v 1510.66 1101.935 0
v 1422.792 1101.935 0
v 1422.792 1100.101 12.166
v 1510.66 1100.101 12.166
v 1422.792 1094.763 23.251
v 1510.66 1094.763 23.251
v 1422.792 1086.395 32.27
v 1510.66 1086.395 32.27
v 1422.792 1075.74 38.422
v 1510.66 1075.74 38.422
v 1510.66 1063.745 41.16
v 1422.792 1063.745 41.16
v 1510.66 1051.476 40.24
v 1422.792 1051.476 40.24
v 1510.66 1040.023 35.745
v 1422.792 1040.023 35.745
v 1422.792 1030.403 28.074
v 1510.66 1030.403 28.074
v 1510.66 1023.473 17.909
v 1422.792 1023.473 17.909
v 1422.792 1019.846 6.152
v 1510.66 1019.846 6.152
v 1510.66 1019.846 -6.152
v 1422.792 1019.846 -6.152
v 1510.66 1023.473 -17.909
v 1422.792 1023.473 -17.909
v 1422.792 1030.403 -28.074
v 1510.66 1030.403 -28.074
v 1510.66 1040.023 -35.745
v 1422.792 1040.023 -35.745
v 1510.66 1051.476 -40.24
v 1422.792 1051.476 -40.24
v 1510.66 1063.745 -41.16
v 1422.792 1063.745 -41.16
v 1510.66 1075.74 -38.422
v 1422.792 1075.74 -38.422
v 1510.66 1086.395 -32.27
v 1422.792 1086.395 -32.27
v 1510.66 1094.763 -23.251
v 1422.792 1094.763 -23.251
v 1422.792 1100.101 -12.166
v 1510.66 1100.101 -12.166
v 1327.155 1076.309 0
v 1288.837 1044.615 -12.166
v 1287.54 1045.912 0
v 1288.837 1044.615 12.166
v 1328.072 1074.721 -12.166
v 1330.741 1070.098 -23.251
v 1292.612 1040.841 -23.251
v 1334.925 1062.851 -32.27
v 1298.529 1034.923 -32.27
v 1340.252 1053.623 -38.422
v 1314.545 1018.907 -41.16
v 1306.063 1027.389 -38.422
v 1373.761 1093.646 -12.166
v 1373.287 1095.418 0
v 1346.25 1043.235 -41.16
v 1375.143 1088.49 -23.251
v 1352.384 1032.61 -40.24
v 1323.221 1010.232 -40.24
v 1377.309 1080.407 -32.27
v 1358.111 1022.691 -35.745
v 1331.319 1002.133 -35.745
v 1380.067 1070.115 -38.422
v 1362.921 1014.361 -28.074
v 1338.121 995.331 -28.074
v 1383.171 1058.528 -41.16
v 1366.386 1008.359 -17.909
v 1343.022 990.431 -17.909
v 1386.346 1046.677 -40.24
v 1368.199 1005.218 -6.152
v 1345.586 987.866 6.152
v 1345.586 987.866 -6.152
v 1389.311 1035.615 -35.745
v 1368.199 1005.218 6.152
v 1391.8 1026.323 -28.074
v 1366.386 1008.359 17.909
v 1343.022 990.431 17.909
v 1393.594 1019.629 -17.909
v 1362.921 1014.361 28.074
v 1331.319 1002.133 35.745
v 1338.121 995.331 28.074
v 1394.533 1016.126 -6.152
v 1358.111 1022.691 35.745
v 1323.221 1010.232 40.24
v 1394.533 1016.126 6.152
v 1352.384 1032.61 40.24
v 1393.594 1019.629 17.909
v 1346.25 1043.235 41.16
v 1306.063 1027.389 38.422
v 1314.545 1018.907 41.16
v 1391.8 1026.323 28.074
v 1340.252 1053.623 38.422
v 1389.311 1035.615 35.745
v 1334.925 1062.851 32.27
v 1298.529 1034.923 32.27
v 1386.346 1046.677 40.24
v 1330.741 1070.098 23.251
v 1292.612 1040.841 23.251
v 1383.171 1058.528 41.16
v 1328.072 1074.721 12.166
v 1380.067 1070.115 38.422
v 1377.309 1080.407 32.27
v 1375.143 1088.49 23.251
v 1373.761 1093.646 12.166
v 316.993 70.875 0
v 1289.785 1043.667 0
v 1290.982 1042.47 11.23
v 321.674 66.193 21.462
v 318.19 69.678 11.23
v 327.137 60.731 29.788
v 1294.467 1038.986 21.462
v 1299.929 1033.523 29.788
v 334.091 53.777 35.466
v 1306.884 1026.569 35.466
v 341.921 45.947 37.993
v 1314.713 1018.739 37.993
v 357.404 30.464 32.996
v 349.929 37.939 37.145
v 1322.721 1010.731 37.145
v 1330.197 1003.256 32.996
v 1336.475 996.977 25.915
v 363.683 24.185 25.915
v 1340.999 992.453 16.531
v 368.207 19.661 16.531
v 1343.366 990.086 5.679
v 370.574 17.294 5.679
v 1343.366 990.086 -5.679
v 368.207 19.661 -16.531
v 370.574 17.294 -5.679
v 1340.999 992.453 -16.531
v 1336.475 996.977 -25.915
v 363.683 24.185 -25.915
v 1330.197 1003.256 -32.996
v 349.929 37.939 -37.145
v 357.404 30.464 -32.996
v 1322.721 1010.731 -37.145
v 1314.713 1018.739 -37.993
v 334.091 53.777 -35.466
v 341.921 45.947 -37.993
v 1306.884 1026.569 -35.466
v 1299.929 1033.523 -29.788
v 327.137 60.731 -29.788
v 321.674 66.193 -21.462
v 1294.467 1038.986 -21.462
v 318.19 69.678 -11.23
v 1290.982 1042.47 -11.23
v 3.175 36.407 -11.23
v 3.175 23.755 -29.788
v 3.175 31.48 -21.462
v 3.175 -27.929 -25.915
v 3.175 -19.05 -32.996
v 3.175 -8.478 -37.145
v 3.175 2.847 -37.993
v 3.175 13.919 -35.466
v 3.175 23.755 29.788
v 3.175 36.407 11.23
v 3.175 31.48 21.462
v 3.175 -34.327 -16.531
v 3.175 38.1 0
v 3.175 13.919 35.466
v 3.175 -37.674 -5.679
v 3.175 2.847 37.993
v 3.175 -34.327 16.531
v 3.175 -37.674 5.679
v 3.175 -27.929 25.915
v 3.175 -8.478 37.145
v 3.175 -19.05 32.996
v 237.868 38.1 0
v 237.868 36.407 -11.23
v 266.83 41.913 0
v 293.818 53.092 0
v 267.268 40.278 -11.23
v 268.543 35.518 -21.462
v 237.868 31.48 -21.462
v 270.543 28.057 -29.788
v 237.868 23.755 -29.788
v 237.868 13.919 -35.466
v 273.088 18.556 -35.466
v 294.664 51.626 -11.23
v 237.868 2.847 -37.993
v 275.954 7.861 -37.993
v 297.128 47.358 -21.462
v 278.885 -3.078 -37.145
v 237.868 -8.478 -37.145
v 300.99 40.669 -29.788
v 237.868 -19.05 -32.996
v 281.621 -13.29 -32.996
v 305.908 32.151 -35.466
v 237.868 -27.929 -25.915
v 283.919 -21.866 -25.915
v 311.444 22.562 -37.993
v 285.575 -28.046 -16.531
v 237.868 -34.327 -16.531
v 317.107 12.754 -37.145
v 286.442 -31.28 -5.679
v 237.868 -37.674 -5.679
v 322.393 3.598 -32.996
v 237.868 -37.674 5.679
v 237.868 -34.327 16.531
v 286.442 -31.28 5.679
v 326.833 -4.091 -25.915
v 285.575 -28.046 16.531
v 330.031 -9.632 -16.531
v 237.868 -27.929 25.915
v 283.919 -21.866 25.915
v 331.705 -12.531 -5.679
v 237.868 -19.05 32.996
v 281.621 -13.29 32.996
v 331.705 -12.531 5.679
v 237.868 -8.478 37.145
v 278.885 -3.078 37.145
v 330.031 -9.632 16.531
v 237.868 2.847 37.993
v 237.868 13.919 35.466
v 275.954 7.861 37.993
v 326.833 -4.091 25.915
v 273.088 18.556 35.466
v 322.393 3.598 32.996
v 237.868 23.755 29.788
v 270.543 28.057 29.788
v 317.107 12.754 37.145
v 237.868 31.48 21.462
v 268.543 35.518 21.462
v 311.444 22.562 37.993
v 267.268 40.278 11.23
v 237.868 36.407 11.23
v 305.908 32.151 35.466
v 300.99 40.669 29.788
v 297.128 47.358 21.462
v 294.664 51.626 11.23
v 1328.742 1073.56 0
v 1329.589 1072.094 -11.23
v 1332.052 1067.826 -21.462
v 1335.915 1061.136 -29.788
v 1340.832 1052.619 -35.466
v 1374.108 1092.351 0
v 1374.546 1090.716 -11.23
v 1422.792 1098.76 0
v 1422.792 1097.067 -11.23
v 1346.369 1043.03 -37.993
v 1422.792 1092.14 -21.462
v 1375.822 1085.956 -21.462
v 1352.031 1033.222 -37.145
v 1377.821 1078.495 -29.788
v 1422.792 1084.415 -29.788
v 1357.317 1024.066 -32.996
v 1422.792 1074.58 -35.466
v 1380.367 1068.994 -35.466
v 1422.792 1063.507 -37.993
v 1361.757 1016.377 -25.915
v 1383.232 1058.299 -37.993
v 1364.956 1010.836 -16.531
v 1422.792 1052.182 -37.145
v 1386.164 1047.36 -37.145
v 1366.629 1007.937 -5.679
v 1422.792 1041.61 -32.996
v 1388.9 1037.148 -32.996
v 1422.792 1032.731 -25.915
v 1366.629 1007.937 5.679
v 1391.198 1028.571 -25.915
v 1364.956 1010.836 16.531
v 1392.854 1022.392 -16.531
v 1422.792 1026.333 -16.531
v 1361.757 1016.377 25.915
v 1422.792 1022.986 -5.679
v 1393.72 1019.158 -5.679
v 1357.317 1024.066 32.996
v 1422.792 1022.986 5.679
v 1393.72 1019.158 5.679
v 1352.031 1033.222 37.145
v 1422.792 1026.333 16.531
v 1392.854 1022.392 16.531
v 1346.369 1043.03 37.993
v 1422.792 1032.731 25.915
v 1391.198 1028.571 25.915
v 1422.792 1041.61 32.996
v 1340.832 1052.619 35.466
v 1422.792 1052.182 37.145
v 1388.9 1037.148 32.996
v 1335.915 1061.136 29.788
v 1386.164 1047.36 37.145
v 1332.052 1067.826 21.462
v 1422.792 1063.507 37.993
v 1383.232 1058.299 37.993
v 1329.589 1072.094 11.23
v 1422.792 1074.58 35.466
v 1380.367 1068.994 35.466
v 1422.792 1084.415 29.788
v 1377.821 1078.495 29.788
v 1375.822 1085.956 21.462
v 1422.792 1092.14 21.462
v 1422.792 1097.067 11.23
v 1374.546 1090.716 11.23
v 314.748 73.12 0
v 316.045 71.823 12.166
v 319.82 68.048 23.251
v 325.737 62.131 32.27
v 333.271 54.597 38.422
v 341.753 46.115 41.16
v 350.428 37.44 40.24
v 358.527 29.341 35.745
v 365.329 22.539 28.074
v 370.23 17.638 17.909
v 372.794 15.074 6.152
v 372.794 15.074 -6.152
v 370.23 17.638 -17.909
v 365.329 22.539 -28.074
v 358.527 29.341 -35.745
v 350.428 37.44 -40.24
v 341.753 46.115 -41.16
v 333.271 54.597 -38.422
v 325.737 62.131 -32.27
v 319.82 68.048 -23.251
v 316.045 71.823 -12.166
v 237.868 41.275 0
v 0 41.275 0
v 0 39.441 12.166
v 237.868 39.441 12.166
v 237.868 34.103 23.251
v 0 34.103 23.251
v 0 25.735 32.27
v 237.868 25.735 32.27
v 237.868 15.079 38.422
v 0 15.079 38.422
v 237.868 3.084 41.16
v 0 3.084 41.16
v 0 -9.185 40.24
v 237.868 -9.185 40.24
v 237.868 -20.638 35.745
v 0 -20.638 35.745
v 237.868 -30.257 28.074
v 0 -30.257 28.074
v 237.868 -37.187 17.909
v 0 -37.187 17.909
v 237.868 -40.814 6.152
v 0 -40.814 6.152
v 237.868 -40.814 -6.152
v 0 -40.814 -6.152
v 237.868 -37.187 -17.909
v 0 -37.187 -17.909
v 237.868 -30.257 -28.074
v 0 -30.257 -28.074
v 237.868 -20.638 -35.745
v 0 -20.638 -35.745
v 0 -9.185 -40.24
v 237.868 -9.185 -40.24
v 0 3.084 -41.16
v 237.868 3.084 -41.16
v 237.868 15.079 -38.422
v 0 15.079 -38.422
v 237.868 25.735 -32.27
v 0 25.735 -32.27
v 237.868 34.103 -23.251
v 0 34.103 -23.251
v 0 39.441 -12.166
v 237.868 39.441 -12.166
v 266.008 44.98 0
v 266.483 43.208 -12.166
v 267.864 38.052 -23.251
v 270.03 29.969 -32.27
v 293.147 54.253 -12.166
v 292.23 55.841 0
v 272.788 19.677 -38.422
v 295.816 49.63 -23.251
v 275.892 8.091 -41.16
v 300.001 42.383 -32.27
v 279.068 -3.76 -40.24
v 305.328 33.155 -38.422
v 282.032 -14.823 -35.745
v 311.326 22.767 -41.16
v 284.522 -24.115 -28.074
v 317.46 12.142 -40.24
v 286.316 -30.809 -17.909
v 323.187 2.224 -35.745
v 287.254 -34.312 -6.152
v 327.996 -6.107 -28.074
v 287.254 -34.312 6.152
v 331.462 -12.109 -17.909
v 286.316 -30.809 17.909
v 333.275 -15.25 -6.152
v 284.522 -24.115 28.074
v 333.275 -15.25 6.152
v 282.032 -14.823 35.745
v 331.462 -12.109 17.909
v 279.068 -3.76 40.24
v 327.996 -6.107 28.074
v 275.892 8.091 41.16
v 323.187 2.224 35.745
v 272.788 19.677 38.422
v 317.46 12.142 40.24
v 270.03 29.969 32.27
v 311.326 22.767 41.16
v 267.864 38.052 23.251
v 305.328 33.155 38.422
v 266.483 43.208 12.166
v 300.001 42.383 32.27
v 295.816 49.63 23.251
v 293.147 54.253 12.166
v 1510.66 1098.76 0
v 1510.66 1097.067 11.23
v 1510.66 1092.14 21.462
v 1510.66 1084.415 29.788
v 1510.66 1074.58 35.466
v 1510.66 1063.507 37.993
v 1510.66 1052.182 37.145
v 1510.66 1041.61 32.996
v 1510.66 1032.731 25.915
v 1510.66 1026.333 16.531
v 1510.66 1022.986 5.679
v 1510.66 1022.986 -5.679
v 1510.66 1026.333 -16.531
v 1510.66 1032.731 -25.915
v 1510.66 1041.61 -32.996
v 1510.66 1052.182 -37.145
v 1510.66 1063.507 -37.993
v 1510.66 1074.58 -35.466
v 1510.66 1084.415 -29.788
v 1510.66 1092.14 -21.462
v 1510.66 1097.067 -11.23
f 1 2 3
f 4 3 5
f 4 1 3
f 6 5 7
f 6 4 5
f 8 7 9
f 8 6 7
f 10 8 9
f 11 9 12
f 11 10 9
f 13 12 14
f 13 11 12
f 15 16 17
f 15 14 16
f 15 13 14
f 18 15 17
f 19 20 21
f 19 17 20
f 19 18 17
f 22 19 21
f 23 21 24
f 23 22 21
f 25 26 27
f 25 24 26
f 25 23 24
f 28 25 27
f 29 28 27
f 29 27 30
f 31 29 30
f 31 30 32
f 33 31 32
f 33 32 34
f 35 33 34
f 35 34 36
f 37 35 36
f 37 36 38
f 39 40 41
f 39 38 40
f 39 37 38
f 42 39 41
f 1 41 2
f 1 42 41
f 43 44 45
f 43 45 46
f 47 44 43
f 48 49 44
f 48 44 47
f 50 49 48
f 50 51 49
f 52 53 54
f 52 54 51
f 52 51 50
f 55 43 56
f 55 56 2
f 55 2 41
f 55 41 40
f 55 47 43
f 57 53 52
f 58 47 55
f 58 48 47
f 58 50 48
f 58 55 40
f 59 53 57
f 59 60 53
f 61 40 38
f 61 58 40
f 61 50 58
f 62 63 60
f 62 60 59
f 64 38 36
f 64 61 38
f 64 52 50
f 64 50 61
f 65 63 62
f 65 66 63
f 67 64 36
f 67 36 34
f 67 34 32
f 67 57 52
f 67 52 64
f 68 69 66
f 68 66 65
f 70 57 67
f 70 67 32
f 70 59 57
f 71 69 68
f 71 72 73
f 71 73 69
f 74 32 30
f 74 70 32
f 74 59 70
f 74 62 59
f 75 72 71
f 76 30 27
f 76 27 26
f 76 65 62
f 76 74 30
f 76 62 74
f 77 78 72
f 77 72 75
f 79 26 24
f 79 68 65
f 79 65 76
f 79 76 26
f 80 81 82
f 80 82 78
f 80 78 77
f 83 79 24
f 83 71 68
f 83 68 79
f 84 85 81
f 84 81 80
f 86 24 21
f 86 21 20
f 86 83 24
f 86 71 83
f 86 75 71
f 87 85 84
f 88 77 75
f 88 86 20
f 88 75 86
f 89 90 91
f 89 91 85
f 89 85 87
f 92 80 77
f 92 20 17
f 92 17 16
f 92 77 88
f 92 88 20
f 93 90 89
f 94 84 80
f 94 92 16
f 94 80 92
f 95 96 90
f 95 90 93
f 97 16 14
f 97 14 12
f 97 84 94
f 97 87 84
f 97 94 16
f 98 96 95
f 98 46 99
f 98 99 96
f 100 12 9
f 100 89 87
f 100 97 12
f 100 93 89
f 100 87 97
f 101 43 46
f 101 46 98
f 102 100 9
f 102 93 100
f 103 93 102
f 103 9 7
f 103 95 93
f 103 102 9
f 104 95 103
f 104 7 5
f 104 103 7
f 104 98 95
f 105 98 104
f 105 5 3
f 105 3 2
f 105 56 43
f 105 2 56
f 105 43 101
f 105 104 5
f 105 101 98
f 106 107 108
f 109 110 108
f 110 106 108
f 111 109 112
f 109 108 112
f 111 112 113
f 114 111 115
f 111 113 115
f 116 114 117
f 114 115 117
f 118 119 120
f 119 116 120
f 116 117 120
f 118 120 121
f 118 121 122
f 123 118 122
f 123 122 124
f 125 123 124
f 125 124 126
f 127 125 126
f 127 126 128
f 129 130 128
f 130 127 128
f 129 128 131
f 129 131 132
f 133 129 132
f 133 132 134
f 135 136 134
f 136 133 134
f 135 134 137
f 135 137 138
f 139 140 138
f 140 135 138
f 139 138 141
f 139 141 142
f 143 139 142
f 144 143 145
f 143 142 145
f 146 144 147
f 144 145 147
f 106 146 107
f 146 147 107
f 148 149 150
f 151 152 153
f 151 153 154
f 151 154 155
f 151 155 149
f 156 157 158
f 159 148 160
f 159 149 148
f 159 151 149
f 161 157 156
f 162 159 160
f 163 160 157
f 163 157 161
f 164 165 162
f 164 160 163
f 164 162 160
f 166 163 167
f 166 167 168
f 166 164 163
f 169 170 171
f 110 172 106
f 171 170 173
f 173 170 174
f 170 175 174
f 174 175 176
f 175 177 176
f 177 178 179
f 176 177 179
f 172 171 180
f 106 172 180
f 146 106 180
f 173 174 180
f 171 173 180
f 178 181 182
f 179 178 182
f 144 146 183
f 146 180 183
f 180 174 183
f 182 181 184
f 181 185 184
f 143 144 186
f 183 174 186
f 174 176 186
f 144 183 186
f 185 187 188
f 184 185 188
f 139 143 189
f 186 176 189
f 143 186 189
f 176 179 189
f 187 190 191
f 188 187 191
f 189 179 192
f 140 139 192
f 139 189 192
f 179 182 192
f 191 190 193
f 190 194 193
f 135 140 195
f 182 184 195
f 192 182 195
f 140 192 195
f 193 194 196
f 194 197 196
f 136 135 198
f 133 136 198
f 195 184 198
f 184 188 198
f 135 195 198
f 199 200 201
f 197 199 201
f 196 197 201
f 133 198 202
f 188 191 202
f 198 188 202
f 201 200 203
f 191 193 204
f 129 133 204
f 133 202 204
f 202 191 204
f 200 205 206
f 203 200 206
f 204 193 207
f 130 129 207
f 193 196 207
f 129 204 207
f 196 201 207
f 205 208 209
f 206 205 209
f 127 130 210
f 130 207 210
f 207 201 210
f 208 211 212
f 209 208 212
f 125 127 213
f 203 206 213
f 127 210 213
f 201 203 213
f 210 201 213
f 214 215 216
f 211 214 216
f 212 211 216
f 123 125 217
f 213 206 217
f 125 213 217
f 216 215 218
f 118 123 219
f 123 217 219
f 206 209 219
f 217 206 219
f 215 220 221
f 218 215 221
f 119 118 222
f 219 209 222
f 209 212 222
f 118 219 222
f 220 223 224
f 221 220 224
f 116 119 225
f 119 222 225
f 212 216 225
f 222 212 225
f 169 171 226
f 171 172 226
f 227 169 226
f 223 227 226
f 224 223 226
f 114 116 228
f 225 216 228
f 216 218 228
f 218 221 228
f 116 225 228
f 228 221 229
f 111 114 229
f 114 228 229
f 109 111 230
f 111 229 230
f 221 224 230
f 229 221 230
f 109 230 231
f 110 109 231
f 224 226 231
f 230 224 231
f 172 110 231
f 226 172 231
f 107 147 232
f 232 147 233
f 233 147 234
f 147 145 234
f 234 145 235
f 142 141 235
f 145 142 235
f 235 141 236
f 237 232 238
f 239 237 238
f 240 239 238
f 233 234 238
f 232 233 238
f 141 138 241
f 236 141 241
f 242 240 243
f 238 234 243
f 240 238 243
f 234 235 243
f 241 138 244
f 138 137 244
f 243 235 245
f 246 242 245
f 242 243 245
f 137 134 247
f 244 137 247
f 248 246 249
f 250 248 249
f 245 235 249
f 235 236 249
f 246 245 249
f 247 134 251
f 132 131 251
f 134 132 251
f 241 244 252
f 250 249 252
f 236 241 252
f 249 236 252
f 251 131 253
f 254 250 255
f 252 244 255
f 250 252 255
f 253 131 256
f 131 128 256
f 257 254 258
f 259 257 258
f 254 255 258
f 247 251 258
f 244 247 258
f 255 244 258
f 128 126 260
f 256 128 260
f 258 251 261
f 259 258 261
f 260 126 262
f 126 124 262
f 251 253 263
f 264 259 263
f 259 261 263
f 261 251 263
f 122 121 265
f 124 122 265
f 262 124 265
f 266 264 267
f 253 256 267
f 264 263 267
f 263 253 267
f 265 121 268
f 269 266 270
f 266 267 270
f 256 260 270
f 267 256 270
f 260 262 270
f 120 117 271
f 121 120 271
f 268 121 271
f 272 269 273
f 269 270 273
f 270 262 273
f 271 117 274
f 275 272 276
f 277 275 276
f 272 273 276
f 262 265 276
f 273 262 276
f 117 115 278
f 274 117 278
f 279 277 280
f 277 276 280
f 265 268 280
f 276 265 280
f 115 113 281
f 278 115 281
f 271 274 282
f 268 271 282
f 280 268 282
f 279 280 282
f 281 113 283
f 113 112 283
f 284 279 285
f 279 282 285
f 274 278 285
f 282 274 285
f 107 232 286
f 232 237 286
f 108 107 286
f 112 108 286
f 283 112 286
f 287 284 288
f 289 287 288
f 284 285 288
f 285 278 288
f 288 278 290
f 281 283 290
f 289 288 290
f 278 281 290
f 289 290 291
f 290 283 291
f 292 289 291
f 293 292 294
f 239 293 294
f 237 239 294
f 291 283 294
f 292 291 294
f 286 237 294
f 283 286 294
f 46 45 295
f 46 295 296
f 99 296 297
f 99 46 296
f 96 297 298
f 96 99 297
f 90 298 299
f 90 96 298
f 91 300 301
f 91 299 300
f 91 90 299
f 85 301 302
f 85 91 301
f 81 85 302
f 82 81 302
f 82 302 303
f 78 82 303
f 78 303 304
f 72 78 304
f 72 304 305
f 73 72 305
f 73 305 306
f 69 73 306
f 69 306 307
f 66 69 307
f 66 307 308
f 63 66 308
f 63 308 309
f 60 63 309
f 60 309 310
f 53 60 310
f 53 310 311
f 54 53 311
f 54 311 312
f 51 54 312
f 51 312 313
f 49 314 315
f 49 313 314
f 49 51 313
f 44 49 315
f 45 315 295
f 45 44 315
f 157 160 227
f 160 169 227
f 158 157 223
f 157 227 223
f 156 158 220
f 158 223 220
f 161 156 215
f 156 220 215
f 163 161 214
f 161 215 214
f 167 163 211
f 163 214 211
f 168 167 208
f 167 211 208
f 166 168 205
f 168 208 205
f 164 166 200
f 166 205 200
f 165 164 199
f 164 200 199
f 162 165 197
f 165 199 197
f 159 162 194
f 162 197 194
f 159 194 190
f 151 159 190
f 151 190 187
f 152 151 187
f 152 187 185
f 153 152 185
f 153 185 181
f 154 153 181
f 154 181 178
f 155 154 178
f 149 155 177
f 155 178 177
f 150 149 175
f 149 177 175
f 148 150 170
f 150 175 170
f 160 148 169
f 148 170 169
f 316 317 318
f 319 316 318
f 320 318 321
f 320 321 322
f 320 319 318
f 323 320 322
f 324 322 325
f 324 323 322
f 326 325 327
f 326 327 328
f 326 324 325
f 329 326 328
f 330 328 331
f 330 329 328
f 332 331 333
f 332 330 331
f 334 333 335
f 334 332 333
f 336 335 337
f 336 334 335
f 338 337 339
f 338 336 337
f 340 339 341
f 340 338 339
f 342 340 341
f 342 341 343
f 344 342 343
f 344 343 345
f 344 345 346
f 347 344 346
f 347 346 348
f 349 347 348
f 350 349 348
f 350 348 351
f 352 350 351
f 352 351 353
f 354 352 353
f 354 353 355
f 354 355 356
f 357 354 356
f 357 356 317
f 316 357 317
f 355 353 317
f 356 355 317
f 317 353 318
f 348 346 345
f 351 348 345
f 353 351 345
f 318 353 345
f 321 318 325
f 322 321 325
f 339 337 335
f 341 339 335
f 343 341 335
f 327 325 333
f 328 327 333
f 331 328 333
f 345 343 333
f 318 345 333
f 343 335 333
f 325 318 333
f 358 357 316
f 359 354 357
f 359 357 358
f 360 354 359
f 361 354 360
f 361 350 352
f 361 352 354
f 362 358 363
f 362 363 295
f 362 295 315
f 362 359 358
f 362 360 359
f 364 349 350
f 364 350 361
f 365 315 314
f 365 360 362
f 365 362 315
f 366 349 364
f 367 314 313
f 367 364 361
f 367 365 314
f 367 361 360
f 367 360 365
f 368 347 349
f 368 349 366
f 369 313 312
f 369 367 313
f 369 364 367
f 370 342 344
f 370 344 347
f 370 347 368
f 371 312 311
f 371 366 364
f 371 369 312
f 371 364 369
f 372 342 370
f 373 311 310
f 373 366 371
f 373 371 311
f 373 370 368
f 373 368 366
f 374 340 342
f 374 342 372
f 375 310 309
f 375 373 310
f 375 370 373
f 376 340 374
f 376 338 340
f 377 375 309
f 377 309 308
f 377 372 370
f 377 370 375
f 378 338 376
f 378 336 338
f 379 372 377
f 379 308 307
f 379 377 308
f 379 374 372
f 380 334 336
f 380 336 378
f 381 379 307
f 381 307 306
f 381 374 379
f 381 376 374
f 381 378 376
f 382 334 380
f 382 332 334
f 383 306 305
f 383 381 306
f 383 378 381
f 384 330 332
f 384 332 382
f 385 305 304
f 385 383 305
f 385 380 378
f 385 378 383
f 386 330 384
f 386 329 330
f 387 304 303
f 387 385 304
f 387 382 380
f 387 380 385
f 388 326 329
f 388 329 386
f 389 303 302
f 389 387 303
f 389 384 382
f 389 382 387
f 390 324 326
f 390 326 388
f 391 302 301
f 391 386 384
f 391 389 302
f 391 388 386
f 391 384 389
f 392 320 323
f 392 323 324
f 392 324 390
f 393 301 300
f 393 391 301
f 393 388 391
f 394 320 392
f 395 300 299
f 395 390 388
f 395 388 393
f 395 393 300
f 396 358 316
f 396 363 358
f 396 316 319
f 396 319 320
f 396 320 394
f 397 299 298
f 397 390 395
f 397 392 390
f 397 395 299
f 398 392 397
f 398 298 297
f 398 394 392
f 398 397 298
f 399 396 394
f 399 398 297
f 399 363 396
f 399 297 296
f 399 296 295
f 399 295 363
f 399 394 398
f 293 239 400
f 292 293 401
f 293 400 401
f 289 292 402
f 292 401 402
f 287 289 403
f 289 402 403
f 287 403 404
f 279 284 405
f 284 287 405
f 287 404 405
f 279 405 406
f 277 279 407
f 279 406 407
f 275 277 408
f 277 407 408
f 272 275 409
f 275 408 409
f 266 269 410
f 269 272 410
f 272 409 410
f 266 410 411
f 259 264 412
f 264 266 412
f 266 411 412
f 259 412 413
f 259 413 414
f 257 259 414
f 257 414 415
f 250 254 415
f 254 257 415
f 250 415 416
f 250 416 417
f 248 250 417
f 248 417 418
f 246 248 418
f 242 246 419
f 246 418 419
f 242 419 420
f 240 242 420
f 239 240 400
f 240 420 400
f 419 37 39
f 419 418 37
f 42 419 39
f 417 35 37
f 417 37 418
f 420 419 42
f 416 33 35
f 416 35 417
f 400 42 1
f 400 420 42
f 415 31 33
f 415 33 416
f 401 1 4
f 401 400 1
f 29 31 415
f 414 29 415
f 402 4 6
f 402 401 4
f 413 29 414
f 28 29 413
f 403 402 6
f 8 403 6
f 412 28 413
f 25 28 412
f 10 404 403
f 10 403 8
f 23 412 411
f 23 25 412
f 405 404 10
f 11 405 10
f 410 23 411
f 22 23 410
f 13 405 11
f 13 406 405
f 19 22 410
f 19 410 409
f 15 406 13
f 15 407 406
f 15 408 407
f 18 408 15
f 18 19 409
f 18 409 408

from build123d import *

# Parameters (mm, degrees)
BARRER2_PROFILE_R = 41.275
VACIADO1_T        = -3.175


with BuildPart() as part:
    # Barrer2: sweep along a path in Croquis1
    with BuildLine(Plane.XY) as barrer2_path:
        Line((0, 0), (237.867965644, 0))
        ThreePointArc((237.867965644, 0), (295.270480499, 11.418070123), (343.933982822, 43.933982822))
        Line((343.933982822, 43.933982822), (1316.726188958, 1016.726188958))
        ThreePointArc((1316.726188958, 1016.726188958), (1365.389691281, 1049.242101657), (1422.792206136, 1060.66017178))
        Line((1422.792206136, 1060.66017178), (1510.66017178, 1060.66017178))
    # Barrer2 profile (on start of the path) → Barrer2 (sweep)
    with BuildSketch(Plane.YZ):
        Circle(BARRER2_PROFILE_R)
    sweep(path=barrer2_path.line)

    # Vaciado1
    vaciado1_openings = [part.faces().sort_by_distance(p)[0] for p in [
        (1510.66017178, 1060.66017178, 0),
    ]]
    offset(amount=VACIADO1_T, openings=vaciado1_openings, kind=Kind.INTERSECTION)


solid = part.part
